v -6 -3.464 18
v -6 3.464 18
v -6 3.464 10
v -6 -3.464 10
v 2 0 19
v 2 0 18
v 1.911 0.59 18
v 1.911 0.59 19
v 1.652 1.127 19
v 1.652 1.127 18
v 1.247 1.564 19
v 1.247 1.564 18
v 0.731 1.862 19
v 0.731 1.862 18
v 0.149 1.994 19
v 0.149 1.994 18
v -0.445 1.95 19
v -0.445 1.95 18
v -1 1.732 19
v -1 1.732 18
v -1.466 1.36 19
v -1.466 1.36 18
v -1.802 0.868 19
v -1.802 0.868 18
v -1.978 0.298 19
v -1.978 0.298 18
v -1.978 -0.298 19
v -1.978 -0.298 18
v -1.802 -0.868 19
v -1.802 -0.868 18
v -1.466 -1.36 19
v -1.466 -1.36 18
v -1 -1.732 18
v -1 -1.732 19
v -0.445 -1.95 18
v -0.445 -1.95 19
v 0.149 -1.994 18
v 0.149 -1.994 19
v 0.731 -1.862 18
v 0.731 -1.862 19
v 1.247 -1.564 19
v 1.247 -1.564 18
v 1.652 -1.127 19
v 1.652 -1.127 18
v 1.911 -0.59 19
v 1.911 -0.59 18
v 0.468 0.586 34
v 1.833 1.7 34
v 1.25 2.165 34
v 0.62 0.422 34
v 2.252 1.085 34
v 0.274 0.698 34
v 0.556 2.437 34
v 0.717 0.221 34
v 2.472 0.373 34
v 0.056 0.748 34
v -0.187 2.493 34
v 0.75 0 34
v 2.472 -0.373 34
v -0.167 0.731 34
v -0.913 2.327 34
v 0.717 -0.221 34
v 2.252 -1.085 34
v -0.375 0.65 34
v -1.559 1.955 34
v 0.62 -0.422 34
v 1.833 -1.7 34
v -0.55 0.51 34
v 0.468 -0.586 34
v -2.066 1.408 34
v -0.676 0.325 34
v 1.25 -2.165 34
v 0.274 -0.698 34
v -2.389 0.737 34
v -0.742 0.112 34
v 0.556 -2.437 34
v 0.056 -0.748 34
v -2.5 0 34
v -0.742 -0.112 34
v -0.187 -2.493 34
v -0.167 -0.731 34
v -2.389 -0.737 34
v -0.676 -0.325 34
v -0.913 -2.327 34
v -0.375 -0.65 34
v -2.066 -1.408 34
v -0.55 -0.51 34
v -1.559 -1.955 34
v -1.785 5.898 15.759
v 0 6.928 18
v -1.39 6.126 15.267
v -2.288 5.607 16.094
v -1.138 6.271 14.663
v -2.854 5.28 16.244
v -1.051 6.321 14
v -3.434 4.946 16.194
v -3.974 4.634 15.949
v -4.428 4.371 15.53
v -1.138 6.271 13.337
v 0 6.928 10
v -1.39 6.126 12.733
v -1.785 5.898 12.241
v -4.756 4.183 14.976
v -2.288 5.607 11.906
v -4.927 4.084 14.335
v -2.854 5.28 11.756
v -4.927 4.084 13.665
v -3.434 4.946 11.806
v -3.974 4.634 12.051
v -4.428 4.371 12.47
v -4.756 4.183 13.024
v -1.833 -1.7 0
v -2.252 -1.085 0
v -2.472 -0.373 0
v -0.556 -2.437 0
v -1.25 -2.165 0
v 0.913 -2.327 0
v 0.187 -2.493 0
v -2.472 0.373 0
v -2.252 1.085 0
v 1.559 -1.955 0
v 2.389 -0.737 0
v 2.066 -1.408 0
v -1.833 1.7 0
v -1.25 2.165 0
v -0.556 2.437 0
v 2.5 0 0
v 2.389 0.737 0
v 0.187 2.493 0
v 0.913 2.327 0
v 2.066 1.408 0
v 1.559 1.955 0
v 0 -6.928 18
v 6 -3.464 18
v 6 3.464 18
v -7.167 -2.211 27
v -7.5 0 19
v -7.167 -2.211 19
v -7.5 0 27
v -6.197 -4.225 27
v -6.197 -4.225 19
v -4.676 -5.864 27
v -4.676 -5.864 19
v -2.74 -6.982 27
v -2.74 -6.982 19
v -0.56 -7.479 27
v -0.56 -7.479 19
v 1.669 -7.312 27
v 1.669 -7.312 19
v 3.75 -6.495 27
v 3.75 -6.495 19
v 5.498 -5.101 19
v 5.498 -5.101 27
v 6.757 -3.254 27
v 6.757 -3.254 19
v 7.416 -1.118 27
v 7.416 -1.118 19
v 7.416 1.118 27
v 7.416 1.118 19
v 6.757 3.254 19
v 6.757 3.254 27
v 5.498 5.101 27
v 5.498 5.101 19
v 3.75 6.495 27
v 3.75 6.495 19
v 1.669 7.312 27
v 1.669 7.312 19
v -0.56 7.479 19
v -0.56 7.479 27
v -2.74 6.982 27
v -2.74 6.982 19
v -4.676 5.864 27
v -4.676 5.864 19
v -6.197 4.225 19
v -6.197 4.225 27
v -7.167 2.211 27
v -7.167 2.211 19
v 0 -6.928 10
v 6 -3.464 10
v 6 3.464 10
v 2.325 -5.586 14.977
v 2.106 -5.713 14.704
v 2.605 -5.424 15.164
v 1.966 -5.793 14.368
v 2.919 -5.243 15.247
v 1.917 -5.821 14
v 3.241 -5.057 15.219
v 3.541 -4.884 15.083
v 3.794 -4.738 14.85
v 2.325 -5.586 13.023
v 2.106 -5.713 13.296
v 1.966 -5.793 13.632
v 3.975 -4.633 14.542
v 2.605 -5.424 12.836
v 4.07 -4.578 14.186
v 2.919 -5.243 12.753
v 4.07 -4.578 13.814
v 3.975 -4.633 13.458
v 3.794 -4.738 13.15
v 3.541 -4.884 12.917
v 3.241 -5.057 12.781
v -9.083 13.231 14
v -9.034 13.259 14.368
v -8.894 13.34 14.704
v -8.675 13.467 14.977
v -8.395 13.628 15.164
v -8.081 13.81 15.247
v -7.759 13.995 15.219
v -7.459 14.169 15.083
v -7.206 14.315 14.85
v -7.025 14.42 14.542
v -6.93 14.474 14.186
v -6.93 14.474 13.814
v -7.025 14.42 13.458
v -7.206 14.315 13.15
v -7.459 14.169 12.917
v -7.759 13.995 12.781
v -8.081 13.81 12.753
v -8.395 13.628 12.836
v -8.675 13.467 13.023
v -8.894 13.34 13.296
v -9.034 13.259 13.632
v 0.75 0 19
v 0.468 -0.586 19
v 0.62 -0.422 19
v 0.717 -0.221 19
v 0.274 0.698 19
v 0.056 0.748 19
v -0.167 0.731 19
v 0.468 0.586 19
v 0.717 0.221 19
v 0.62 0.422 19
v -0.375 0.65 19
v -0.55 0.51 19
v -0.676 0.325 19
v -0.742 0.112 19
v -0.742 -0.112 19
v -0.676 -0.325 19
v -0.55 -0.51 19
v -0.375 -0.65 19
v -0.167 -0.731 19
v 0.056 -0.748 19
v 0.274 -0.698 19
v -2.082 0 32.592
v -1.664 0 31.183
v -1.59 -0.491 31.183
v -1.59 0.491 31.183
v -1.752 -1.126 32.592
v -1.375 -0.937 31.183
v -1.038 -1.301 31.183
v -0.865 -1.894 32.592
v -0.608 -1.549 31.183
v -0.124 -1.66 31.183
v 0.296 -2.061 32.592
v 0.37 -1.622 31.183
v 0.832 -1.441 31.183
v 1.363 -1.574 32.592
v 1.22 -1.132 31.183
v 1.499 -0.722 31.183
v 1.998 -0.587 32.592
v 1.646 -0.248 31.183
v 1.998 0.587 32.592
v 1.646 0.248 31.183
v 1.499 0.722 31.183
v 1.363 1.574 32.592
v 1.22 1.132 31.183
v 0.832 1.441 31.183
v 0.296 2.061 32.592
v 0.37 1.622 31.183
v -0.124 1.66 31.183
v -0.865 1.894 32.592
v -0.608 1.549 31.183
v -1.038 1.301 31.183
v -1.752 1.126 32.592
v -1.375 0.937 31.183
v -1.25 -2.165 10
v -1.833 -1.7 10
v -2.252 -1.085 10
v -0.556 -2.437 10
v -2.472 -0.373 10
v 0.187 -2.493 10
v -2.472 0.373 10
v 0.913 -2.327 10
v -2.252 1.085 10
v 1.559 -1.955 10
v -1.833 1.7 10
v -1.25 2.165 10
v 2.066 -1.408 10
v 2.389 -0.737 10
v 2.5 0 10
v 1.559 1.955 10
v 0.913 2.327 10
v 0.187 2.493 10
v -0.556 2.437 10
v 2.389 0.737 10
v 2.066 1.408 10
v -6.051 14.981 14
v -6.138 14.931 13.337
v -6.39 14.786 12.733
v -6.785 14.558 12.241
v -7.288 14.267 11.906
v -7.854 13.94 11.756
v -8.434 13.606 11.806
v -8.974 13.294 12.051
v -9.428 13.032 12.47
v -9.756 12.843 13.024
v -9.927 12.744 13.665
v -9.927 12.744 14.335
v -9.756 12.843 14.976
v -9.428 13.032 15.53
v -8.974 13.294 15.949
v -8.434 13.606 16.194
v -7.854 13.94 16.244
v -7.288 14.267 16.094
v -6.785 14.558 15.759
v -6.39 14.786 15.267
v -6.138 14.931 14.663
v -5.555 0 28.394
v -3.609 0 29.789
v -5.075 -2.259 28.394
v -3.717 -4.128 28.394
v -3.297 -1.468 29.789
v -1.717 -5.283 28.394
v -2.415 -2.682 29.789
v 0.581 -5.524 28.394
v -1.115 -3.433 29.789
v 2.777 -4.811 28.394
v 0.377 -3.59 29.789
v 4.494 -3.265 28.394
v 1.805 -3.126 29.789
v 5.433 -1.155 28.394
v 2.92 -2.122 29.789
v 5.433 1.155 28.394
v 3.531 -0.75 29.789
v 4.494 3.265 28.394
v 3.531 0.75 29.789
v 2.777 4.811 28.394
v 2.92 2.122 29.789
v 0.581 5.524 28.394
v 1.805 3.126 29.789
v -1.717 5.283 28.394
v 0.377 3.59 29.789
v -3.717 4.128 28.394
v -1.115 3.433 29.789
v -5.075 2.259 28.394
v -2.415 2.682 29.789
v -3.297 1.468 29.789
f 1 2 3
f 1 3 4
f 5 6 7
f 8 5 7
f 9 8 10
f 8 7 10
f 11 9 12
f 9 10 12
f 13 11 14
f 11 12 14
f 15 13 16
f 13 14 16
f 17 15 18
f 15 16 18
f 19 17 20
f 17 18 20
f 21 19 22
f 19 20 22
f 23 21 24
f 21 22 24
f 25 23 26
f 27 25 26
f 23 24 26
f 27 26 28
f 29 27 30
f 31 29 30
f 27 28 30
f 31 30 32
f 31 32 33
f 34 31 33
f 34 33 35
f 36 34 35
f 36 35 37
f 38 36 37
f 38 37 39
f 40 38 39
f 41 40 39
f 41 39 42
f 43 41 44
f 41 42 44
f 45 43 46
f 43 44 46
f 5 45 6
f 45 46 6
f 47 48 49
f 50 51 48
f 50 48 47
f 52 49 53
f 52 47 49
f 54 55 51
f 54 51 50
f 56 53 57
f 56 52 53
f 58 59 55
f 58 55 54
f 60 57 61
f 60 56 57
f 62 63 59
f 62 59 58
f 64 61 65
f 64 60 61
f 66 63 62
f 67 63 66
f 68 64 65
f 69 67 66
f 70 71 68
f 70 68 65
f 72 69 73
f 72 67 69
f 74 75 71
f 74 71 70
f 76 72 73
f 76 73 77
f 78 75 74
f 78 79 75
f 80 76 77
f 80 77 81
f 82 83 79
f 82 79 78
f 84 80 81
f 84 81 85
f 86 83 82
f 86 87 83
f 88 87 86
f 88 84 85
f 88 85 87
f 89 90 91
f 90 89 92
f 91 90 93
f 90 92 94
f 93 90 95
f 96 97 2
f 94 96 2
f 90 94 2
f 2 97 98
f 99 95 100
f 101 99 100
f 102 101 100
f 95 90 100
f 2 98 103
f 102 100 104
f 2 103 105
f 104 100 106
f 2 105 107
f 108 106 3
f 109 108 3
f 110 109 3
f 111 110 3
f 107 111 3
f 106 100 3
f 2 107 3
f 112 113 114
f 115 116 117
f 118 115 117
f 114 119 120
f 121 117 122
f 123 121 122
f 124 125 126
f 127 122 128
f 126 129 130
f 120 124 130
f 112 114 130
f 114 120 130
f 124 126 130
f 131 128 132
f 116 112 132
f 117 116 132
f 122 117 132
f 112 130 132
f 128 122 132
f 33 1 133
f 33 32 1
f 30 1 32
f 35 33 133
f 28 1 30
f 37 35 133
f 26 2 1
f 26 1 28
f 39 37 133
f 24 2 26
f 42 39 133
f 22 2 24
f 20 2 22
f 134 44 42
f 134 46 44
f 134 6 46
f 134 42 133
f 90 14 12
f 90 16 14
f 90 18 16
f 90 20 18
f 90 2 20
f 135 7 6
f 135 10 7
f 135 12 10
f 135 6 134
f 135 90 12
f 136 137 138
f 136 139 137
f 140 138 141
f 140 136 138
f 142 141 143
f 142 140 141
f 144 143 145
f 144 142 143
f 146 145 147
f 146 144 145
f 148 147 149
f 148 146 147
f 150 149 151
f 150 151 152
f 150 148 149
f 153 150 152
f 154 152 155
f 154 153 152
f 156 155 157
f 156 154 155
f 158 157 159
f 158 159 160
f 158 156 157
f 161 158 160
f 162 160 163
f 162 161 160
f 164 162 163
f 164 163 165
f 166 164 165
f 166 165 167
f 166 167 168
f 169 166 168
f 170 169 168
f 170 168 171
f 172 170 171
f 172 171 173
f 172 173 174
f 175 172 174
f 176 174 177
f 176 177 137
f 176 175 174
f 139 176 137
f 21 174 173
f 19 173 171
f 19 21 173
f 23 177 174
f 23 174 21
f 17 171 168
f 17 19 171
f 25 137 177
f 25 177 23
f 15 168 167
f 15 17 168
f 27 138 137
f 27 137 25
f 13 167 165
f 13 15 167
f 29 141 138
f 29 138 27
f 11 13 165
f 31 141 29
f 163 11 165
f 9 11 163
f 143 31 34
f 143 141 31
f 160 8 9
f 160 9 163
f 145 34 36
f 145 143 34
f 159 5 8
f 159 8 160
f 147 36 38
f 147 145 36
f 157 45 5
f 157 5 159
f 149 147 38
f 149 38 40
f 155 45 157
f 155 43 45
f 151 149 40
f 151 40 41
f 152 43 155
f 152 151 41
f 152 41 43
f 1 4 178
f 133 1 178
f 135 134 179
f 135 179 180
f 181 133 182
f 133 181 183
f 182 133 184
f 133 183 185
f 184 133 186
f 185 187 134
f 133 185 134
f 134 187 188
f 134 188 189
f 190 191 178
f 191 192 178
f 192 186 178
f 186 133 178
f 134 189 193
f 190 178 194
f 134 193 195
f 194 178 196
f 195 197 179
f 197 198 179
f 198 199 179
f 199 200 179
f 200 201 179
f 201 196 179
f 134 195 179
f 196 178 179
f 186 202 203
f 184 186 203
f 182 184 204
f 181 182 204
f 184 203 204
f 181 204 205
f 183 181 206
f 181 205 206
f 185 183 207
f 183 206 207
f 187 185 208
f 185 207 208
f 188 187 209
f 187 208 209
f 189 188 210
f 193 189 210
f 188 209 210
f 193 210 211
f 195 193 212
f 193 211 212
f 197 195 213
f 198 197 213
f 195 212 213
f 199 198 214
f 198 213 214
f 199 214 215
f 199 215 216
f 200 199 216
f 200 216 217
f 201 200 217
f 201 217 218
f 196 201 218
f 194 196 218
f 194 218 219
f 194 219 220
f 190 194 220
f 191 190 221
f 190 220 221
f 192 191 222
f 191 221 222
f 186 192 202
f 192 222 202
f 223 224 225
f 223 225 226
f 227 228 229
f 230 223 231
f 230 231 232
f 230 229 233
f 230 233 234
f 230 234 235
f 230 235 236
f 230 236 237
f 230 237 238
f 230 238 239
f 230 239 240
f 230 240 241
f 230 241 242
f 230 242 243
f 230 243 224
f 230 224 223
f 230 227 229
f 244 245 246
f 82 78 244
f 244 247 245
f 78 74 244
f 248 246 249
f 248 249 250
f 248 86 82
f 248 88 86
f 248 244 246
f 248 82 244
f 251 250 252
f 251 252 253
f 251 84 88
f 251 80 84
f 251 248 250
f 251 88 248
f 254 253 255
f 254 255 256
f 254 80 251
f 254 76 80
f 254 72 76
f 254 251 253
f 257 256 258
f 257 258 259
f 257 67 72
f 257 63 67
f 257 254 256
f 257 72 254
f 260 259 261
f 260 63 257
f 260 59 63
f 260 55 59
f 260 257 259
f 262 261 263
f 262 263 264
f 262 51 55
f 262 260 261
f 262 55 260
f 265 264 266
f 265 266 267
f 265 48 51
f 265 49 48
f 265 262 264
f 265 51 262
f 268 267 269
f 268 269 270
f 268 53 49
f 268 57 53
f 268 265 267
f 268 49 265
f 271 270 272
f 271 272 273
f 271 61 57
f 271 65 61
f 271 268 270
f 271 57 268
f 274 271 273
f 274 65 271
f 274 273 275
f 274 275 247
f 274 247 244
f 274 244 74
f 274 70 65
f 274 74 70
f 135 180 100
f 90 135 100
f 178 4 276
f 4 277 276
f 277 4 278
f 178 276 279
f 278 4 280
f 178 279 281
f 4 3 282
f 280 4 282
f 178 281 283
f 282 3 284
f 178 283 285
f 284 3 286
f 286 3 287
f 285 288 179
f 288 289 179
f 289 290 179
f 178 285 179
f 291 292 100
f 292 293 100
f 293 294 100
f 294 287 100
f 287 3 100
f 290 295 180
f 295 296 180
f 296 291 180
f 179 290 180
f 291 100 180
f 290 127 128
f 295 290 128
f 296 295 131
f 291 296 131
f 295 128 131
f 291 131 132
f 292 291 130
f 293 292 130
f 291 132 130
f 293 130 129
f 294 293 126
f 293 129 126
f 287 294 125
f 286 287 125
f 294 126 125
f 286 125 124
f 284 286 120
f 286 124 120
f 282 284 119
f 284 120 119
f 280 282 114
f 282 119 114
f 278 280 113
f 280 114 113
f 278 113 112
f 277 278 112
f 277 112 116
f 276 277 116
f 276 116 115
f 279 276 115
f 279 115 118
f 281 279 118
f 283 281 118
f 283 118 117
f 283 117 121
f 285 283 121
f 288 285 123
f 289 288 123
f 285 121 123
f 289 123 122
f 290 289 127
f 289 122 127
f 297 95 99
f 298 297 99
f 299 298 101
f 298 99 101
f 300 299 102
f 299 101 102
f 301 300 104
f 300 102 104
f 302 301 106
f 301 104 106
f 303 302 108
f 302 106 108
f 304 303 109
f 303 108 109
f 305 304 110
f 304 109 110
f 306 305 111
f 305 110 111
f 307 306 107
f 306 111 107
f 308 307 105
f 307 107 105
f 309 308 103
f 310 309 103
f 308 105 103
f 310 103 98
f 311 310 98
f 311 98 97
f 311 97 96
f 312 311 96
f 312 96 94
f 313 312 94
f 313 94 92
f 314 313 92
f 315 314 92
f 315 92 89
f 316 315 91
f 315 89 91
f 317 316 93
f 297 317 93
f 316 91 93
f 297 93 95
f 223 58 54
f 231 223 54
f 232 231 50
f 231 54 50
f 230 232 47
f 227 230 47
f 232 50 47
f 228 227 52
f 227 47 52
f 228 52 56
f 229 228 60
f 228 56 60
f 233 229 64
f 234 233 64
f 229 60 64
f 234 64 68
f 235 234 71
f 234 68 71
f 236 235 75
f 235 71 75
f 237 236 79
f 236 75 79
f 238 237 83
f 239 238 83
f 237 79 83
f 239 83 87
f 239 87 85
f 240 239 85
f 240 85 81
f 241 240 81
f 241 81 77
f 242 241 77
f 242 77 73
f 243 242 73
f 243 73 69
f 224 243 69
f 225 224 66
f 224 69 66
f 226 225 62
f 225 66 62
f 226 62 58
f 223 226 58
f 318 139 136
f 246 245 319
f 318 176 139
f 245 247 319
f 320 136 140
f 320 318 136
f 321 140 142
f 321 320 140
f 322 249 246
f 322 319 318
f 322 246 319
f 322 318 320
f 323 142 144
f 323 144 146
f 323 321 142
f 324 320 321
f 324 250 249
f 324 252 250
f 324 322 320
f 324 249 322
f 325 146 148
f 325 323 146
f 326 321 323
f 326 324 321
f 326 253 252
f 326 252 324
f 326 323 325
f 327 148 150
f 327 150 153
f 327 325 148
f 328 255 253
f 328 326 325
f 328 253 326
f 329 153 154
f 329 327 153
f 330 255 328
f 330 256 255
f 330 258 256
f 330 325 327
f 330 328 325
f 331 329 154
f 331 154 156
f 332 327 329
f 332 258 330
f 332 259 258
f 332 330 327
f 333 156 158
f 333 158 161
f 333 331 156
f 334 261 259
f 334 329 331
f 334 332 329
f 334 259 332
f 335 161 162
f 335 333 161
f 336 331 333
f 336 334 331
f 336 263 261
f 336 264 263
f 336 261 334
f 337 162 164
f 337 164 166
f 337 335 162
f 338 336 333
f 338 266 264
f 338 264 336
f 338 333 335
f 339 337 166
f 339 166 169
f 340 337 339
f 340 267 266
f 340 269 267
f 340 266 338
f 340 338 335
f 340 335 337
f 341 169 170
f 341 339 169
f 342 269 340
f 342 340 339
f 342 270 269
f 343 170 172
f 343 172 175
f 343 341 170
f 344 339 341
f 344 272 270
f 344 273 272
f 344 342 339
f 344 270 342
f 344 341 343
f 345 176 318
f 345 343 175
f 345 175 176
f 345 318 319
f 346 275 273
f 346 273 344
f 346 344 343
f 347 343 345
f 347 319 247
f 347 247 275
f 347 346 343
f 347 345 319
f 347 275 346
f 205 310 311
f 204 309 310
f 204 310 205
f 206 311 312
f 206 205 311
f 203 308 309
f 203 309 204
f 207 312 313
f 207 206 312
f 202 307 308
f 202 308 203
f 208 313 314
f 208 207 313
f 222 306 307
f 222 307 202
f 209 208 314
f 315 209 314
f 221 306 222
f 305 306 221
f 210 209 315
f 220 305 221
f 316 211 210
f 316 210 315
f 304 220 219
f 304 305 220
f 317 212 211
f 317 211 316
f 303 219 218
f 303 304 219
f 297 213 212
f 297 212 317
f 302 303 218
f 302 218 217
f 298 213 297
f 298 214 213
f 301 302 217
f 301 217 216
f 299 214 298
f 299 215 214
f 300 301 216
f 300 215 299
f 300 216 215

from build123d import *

# Parameters (mm, degrees)
SKETCH_1_R          = 2.5
EXTRUDE_1_DEPTH     = 10
EXTRUDE_2_DEPTH     = 8
SKETCH_3_R          = 2
EXTRUDE_3_DEPTH     = 1
SKETCH_5_R          = 0.75
CUT_EXTRUDE_1_DEPTH = 15
SKETCH_6_R          = 2.25
EXTRUDE_4_DEPTH     = 10
SKETCH_7_R          = 1.25
CUT_EXTRUDE_2_DEPTH = 22


with BuildPart() as part:
    # 草图1 → 凸台-拉伸1 (new body)
    with BuildSketch(Plane.XY):
        Circle(SKETCH_1_R)
    extrude(amount=EXTRUDE_1_DEPTH)

    # 草图2 → 凸台-拉伸2 (add)
    with BuildSketch(Plane.XY.offset(10)):
        Polygon((6, 3.464101615), (0, 6.92820323), (-6, 3.464101615), (-6, -3.464101615), (0, -6.92820323), (6, -3.464101615), align=None)
    extrude(amount=EXTRUDE_2_DEPTH)

    # 草图3 → 凸台-拉伸3 (add)
    with BuildSketch(Plane.XY.offset(18)):
        Circle(SKETCH_3_R)
    extrude(amount=EXTRUDE_3_DEPTH)

    # 草图4 → 旋转1 (revolve)
    with BuildSketch(Plane(origin=(0, 0, 0), x_dir=(1, 0, 0), z_dir=(0, 1, 0)), mode=Mode.PRIVATE) as revolve_1_sk:
        Polygon((0, -19), (7.5, -19), (7.5, -27), (1.664204883, -31.183358747), (2.5, -34), (0, -34), align=None)
    revolve(revolve_1_sk.sketch.rotate(Axis((0, 0, 19), (0, 0, 1)), 180), axis=Axis((0, 0, 19), (0, 0, 1)))

    # 草图5 → 切除-拉伸1 (cut)
    with BuildSketch(Plane.XY.offset(34)):
        Circle(SKETCH_5_R)
    extrude(amount=-CUT_EXTRUDE_1_DEPTH, mode=Mode.SUBTRACT)

    # 草图6 → 凸台-拉伸4 (add)
    with BuildSketch(Plane(origin=(-3, 5.196152423, 0), x_dir=(0.8660254037844388, 0.49999999999999983, 0), z_dir=(-0.4999999999999998, 0.8660254037844387, 0))):
        with Locations((0, -14)):
            Circle(SKETCH_6_R)
    extrude(amount=EXTRUDE_4_DEPTH)

    # 草图7 → 切除-拉伸2 (cut)
    with BuildSketch(Plane(origin=(-8, 13.856406461, 0), x_dir=(0.8660254037844387, 0.49999999999999994, 0), z_dir=(-0.4999999999999999, 0.8660254037844386, 0))):
        with Locations(Location((0, -14, 0), (0, 0, 180))):
            Circle(SKETCH_7_R)
    extrude(amount=-CUT_EXTRUDE_2_DEPTH, mode=Mode.SUBTRACT)


solid = part.part
